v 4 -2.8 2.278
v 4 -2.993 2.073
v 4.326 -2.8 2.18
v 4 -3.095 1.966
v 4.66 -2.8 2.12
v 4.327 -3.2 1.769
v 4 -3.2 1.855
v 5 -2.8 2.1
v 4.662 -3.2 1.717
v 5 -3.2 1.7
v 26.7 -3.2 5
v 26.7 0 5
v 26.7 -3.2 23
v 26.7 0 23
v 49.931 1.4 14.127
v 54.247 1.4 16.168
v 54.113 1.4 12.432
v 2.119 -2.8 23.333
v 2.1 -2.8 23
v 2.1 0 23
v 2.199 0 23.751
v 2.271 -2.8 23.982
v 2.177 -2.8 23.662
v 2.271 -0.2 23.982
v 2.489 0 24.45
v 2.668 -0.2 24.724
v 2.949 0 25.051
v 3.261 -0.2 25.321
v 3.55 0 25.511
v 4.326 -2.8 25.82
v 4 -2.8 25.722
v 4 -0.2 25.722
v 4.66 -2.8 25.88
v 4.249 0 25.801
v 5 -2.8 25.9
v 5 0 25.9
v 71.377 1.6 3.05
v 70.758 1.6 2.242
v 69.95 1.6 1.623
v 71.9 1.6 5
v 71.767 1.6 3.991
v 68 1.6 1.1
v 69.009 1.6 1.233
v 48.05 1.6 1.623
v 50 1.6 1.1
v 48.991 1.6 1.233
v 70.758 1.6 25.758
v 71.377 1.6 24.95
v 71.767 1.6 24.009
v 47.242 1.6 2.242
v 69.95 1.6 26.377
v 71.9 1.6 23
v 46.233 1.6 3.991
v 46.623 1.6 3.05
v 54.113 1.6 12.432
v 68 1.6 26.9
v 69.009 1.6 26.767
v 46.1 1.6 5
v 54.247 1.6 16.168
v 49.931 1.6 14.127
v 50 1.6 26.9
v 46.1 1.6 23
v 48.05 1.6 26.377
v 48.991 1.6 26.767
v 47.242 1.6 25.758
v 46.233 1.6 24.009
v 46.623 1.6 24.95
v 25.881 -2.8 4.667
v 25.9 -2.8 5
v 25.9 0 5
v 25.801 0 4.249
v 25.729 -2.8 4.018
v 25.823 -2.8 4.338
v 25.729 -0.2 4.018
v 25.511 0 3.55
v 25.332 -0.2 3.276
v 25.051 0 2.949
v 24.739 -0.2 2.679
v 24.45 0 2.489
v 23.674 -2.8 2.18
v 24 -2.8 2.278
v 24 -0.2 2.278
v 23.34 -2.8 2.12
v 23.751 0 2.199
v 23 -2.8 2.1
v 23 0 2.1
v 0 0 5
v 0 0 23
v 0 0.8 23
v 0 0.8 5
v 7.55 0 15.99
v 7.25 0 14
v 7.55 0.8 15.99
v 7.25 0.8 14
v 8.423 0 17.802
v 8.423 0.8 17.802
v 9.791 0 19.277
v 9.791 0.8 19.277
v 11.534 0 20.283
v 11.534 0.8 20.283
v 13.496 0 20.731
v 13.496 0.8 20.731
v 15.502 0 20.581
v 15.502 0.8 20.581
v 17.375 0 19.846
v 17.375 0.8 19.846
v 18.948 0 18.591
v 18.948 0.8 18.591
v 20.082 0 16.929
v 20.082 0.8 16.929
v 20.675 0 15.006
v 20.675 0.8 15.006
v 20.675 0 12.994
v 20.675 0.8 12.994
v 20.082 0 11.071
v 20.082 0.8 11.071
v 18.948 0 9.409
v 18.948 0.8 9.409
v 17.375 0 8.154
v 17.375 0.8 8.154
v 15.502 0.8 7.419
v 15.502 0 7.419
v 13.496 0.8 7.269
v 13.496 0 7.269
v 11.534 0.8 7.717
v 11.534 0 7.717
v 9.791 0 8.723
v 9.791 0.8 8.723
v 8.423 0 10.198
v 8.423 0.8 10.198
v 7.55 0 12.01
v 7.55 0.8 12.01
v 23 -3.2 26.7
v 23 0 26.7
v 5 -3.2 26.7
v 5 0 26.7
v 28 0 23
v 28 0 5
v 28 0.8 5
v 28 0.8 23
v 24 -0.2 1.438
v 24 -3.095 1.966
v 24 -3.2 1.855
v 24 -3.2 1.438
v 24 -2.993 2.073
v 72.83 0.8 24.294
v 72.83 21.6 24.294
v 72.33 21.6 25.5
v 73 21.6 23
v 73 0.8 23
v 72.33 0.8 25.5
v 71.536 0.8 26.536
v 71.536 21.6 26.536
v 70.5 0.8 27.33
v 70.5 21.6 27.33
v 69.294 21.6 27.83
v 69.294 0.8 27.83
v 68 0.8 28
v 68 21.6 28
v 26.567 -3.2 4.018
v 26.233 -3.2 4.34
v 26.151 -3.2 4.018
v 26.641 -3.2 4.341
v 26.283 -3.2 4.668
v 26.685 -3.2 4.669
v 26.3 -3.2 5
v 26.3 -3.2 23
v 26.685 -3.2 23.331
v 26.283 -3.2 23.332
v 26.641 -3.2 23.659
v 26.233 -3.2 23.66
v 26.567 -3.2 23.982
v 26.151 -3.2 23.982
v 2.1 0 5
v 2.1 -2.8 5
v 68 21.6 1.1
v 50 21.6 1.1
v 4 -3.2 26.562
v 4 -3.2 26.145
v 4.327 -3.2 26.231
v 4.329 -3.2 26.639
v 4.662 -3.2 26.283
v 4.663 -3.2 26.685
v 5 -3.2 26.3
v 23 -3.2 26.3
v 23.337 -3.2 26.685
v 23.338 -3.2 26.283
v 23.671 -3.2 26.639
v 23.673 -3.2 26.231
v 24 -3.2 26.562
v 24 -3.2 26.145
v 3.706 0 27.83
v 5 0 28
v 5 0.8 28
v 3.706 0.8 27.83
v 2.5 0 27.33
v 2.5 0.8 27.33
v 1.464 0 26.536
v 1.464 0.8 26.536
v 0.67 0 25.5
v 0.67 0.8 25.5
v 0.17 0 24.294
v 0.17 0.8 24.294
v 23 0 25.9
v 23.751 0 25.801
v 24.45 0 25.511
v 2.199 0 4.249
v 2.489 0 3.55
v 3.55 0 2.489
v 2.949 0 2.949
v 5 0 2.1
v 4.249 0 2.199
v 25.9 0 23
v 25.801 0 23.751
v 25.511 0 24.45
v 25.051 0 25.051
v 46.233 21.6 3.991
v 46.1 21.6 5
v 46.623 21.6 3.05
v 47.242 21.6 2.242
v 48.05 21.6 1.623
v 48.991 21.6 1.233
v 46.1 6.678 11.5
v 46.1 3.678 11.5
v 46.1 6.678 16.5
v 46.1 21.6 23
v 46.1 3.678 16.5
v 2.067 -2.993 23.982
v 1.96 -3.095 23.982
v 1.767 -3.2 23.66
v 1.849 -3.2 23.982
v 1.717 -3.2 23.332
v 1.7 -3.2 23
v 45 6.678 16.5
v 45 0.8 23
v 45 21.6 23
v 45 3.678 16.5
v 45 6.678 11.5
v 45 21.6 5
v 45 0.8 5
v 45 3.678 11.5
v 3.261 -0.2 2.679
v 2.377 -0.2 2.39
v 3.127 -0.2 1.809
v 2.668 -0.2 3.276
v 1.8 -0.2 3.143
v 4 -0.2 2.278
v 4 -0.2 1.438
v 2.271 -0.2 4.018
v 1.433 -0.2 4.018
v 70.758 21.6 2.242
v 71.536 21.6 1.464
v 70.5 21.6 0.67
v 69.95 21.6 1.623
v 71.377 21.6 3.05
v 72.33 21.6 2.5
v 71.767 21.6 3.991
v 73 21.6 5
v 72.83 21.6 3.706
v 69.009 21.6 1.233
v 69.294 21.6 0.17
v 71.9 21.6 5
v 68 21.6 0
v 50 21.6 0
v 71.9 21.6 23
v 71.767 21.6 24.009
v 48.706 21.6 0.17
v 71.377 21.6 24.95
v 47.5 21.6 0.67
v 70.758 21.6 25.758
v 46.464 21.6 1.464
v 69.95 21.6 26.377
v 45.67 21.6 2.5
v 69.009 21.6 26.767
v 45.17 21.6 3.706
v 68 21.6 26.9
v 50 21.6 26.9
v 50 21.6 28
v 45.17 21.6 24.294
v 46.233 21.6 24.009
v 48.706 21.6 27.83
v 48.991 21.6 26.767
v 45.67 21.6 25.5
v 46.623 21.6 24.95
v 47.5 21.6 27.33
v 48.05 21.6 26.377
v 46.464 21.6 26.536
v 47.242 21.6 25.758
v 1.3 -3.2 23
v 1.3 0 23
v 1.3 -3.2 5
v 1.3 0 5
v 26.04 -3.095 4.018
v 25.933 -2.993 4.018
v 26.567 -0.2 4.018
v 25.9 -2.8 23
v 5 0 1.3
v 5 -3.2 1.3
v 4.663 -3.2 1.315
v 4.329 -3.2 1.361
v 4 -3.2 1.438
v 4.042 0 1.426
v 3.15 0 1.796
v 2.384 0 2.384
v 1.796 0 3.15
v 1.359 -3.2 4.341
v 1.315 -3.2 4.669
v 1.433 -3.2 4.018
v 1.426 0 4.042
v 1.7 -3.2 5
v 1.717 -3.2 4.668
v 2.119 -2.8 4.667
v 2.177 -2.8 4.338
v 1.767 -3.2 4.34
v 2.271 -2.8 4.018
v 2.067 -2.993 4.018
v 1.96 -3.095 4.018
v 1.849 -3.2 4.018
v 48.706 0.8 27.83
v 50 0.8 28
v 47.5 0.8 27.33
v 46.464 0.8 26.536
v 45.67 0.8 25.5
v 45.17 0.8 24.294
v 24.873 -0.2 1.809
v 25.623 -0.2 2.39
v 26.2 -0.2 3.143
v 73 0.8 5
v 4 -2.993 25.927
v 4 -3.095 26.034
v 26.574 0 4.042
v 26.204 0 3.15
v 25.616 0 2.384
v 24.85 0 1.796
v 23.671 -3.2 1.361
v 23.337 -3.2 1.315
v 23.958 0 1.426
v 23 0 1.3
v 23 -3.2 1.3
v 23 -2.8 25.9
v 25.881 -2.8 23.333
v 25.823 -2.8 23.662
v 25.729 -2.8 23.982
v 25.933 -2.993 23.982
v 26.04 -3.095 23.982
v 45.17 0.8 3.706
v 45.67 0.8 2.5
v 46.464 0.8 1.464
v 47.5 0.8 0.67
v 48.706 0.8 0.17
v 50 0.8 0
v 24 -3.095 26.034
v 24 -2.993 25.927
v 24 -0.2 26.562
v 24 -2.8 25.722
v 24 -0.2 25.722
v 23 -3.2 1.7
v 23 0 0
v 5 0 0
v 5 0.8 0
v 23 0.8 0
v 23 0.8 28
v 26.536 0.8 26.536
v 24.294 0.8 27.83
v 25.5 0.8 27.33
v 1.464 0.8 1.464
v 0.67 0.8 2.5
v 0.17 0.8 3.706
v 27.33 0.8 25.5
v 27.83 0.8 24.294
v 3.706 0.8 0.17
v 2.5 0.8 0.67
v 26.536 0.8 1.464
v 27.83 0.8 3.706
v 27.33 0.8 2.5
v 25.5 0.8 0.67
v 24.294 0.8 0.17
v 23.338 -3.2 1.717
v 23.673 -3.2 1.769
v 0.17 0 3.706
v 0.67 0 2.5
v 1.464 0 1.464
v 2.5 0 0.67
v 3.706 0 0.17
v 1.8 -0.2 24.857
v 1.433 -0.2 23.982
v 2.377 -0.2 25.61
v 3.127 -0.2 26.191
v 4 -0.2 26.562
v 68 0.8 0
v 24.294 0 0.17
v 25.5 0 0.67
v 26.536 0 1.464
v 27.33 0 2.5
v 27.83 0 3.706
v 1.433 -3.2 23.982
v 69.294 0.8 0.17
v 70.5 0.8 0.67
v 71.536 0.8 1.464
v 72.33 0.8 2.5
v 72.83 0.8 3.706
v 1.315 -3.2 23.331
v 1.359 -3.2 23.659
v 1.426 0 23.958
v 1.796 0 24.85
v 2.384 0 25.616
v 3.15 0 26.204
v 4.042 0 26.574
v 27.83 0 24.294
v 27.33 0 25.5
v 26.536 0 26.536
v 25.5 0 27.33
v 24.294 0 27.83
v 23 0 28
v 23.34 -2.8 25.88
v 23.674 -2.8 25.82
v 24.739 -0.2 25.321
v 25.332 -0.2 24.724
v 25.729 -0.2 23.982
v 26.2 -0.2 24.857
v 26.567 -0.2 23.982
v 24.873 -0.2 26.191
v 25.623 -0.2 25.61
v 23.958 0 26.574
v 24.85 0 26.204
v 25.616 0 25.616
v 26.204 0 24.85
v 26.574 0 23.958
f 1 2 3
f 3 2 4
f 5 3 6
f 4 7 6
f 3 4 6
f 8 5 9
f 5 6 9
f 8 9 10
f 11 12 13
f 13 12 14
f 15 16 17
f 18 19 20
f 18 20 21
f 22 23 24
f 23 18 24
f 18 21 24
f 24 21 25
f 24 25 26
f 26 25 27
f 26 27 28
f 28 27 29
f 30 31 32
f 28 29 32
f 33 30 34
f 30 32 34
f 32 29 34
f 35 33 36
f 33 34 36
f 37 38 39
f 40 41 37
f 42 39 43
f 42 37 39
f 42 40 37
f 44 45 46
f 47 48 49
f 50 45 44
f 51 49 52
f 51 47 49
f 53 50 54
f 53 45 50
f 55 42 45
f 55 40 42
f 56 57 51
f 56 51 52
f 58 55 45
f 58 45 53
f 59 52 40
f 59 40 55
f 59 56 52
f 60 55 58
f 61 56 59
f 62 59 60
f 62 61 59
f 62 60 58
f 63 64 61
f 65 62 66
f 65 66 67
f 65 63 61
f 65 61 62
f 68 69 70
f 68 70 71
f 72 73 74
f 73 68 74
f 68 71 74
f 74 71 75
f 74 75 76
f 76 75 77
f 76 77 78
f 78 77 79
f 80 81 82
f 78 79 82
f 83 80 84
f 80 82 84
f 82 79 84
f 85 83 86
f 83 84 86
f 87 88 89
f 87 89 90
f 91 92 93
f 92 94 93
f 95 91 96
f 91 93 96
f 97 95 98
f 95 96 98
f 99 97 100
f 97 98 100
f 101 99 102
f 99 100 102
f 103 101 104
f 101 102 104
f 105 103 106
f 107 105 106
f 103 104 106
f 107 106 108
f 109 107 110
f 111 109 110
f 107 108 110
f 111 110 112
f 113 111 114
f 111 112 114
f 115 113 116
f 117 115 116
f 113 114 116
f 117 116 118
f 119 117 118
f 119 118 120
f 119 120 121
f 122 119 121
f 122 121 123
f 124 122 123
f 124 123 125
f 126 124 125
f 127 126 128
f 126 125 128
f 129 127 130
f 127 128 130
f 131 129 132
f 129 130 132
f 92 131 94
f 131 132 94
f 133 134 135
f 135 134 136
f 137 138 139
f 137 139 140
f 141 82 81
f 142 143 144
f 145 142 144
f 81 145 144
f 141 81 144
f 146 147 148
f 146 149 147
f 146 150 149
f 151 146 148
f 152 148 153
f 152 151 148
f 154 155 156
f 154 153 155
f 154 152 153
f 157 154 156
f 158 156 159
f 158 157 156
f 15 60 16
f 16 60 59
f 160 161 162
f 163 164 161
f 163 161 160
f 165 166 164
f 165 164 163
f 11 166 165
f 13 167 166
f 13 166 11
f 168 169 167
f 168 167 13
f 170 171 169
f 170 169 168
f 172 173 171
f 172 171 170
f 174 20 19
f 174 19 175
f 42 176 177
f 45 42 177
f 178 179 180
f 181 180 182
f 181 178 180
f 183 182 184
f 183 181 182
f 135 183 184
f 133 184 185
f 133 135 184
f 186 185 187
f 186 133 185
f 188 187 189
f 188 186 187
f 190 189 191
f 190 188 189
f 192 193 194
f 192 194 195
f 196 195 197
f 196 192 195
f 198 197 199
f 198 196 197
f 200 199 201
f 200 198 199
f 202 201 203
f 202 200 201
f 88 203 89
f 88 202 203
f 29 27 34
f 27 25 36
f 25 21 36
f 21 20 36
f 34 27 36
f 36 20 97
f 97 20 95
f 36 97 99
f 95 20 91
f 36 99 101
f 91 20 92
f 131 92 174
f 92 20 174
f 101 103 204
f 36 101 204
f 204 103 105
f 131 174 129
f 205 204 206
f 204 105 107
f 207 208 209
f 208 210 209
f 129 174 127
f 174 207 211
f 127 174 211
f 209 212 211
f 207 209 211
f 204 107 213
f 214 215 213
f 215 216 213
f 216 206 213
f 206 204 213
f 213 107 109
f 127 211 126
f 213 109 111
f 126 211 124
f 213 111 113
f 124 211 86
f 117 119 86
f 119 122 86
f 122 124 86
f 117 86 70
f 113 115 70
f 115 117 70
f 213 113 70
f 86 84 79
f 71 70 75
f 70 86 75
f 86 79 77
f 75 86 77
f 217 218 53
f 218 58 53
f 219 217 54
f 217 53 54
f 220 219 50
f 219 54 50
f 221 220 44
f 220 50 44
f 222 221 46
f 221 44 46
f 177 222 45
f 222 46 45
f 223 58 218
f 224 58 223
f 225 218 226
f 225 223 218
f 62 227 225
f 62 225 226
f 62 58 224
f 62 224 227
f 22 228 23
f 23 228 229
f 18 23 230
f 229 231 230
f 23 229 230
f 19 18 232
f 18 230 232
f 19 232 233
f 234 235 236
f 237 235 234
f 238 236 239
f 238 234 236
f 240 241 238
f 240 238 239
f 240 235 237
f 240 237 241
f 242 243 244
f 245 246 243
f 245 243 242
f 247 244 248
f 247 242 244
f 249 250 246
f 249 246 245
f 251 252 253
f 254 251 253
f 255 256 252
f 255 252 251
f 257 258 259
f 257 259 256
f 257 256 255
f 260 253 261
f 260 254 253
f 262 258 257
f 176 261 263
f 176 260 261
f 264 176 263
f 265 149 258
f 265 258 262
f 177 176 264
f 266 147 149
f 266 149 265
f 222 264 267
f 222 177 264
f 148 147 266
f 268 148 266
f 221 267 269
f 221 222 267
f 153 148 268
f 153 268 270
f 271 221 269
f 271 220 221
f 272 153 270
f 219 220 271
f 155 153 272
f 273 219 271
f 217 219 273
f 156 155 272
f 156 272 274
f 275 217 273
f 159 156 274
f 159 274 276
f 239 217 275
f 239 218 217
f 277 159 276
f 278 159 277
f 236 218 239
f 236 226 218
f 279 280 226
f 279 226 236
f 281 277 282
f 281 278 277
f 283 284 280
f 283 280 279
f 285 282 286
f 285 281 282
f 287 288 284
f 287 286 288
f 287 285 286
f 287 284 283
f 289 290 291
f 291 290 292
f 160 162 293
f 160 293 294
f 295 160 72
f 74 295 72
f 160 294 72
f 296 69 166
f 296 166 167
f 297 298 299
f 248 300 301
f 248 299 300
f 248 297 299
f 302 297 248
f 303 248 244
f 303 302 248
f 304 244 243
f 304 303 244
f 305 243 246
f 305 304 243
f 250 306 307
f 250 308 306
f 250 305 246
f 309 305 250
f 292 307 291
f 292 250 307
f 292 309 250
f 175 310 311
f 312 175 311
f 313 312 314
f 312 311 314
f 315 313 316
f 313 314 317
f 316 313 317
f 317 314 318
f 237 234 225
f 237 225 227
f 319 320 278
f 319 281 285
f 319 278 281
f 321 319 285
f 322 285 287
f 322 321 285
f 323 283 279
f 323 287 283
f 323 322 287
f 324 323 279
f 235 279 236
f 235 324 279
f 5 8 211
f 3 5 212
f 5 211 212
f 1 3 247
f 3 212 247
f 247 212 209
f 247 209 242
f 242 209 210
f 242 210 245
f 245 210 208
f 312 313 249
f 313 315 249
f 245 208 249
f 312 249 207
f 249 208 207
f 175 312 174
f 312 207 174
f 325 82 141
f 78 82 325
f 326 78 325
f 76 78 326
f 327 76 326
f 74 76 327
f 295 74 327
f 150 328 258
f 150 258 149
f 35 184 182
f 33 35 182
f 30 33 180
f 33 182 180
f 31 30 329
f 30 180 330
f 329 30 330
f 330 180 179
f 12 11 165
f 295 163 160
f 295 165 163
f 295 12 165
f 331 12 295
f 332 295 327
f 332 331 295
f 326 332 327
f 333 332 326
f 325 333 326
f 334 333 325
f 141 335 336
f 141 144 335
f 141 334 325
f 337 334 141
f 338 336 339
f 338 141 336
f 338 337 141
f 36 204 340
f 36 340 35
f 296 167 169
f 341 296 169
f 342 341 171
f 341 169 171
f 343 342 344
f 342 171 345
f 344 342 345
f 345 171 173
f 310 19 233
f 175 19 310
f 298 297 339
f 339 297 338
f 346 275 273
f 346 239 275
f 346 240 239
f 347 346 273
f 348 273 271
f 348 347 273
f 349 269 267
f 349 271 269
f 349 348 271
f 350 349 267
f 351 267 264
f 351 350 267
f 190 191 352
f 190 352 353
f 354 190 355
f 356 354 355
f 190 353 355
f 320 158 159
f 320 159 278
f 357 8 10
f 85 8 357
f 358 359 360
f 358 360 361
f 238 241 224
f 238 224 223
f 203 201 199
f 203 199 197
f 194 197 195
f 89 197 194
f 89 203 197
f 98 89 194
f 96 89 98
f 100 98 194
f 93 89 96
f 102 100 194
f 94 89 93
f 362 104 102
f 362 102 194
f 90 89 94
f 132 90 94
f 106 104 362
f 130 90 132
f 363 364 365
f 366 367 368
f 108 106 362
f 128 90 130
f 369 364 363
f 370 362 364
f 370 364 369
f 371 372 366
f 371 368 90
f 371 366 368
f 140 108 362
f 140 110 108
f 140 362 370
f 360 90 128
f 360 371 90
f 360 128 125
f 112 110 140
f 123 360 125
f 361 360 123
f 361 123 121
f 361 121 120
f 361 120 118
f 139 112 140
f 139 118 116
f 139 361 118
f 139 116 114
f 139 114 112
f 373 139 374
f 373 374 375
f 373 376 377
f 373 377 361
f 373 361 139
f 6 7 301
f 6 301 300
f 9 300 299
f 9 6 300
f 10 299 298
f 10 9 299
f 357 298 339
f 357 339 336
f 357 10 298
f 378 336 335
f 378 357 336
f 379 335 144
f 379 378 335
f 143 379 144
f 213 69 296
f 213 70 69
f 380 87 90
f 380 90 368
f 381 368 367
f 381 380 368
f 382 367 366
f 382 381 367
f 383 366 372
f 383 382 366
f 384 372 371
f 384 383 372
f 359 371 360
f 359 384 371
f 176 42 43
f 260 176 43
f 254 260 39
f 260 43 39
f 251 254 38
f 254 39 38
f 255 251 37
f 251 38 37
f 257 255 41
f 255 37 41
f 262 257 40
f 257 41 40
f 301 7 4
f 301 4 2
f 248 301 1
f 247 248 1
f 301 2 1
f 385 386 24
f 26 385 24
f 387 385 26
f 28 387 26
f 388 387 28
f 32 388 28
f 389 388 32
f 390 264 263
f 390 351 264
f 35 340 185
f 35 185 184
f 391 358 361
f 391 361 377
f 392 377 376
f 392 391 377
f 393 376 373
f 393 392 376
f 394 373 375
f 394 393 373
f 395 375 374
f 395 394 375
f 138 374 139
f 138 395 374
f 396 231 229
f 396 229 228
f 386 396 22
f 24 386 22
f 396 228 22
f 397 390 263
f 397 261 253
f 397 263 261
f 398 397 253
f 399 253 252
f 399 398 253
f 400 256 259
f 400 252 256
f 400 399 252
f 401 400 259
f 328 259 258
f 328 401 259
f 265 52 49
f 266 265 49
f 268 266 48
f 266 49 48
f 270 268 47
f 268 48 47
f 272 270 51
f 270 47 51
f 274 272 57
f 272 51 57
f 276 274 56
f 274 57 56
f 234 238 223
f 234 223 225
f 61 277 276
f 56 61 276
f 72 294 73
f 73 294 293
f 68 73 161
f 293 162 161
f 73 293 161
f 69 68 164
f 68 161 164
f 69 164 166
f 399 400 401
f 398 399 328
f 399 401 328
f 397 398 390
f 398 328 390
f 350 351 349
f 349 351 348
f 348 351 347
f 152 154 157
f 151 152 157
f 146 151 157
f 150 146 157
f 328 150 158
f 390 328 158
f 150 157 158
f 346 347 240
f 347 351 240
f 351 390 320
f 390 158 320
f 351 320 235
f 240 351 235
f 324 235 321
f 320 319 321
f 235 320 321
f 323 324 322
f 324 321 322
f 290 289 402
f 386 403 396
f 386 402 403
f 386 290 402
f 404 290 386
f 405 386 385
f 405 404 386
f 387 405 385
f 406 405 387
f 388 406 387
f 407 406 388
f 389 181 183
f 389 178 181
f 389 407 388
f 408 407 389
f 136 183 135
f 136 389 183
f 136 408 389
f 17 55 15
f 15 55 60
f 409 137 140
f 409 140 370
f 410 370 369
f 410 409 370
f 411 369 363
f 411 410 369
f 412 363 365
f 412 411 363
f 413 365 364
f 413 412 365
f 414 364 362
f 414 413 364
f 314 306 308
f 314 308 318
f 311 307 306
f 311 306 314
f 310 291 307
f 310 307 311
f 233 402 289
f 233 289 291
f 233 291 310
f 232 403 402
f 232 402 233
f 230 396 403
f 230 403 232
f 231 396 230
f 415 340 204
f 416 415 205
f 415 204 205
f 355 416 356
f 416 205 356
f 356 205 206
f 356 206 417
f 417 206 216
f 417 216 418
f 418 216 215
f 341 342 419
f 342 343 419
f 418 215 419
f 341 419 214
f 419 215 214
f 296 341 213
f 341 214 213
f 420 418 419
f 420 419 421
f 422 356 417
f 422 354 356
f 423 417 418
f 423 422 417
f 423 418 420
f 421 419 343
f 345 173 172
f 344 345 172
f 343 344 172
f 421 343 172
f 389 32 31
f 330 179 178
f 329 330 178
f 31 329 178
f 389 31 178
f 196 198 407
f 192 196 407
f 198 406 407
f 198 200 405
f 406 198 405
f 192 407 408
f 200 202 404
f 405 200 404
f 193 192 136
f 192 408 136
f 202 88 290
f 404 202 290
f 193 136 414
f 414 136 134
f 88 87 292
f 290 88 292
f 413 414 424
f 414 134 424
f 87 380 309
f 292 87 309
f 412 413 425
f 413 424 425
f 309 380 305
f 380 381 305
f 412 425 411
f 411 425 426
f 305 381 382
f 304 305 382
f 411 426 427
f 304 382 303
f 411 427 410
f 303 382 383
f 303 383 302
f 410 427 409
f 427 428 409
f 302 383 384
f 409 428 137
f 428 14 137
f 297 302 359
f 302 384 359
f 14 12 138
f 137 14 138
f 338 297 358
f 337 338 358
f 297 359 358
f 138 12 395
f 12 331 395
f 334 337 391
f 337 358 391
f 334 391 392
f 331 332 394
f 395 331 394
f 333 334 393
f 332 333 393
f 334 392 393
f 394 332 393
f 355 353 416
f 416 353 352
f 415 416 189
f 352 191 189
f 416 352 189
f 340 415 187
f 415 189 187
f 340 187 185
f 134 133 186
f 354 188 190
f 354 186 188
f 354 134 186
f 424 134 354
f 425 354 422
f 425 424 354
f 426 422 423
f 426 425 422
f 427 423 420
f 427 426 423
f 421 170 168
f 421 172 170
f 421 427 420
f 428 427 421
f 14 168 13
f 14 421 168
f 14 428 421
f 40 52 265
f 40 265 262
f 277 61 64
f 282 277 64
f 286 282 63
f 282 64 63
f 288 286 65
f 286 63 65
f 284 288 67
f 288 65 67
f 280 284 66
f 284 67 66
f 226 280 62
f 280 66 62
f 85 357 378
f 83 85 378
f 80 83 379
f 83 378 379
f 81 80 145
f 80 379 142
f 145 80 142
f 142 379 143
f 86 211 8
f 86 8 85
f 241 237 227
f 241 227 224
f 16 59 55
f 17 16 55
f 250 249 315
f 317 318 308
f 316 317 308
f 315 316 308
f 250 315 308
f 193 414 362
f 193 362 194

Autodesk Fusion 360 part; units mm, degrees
sketch "Sketch1" plane through (0, 0, 0) normal (0, 1, 0) x (1, 0, 0)
  line L0 (5, 0) -> (23, 0)
  line L1 (28, -5) -> (28, -23)
  line L2 (23, -28) -> (5, -28)
  line L3 (0, -23) -> (0, -5)
  arc A0 (5, 0) -> (0, -5) centre (5, -5) ccw
  arc A1 (28, -5) -> (23, 0) centre (23, -5) ccw
  arc A2 (23, -28) -> (28, -23) centre (23, -23) ccw
  arc A3 (0, -23) -> (5, -28) centre (5, -23) ccw
  point P0 (28, 0)
  point P1 (0, -28)
  dimension "d1" = 28
  dimension "d2" = 28
  dimension "d3" = 5
extrude "Extrude1" add sketch "Sketch1" along normal blind 0.8 makes body 1
sketch "Sketch2" plane through (0, 0.8, 0) normal (0, 1, 0) x (-1, 0, 0)
  arc A0 (-5, 0) -> (0, 5) centre (-5, 5) ccw
  line L0 (0, 5) -> (0, 23)
  arc A1 (0, 23) -> (-5, 28) centre (-5, 23) ccw
  line L1 (-5, 28) -> (-23, 28)
  arc A2 (-23, 28) -> (-28, 23) centre (-23, 23) ccw
  line L2 (-28, 23) -> (-28, 5)
  arc A3 (-28, 5) -> (-23, 0) centre (-23, 5) ccw
  line L3 (-23, 0) -> (-5, 0)
  line L4 (0, 14) -> (-28, 14)
  line L5 (-14, 0) -> (-14, 28)
  circle A4 centre (-14, 14) radius 6.75
  dimension "d6" = 13.5
extrude "Extrude2" cut sketch "Sketch2" against normal blind 10 contours L4 L5 A4 | L4 L5 A4 | L4 L5 A4 | L4 L5 A4 bodies 1
sketch "Sketch3" plane through (0, 0, 0) normal (0, -1, 0) x (1, 0, 0)
  circle A0 centre (14, 14) radius 6.75
  arc A1 (0, 5) -> (5, 0) centre (5, 5) ccw
  line L0 (5, 0) -> (23, 0)
  arc A2 (23, 0) -> (28, 5) centre (23, 5) ccw
  line L1 (28, 5) -> (28, 23)
  arc A3 (28, 23) -> (23, 28) centre (23, 23) ccw
  line L2 (23, 28) -> (5, 28)
  arc A4 (5, 28) -> (0, 23) centre (5, 23) ccw
  line L3 (0, 23) -> (0, 5)
  arc A5 (5, 26.7) -> (1.3, 23) centre (5, 23) ccw
  line L4 (1.3, 23) -> (1.3, 5)
  arc A6 (1.3, 5) -> (5, 1.3) centre (5, 5) ccw
  line L5 (5, 1.3) -> (23, 1.3)
  arc A7 (23, 1.3) -> (26.7, 5) centre (23, 5) ccw
  line L6 (26.7, 5) -> (26.7, 23)
  arc A8 (26.7, 23) -> (23, 26.7) centre (23, 23) ccw
  line L7 (23, 26.7) -> (5, 26.7)
  arc A9 (5, 25.9) -> (2.1, 23) centre (5, 23) ccw
  line L8 (2.1, 23) -> (2.1, 5)
  arc A10 (2.1, 5) -> (5, 2.1) centre (5, 5) ccw
  line L9 (5, 2.1) -> (23, 2.1)
  arc A11 (23, 2.1) -> (25.9, 5) centre (23, 5) ccw
  line L10 (25.9, 5) -> (25.9, 23)
  arc A12 (25.9, 23) -> (23, 25.9) centre (23, 23) ccw
  line L11 (23, 25.9) -> (5, 25.9)
  dimension "d9" = -1.3
  dimension "d10" = -2.1
extrude "Extrude3" add sketch "Sketch3" along normal blind 3.2 contours A5 L4 A6 L5 A7 L6 A8 L7 bodies 1
sketch "Sketch4" plane through (0, 0.8, 0) normal (0, 1, 0) x (-1, 0, 0)
  circle A0 centre (-14, 14) radius 6.75
  arc A1 (-5, 0) -> (0, 5) centre (-5, 5) ccw
  line L0 (0, 5) -> (0, 23)
  arc A2 (0, 23) -> (-5, 28) centre (-5, 23) ccw
  line L1 (-5, 28) -> (-23, 28)
  arc A3 (-23, 28) -> (-28, 23) centre (-23, 23) ccw
  line L2 (-28, 23) -> (-28, 5)
  arc A4 (-28, 5) -> (-23, 0) centre (-23, 5) ccw
  line L3 (-23, 0) -> (-5, 0)
  line L4 (-50, 0) -> (-68, 0)
  line L5 (-73, 5) -> (-73, 23)
  line L6 (-68, 28) -> (-50, 28)
  line L7 (-45, 23) -> (-45, 5)
  arc A5 (-50, 0) -> (-45, 5) centre (-50, 5) ccw
  arc A6 (-73, 5) -> (-68, 0) centre (-68, 5) ccw
  arc A7 (-68, 28) -> (-73, 23) centre (-68, 23) ccw
  arc A8 (-45, 23) -> (-50, 28) centre (-50, 23) ccw
  point P0 (-45, 0)
  point P1 (-73, 0)
  point P2 (-45, 28)
  dimension "d13" = 28
  dimension "d14" = 28
  dimension "d15" = 5
extrude "Extrude4" add sketch "Sketch4" along normal blind 0.8 separate body contours L4 L5 L6 L7 A5 A6 A7 A8 makes body 2
sketch "Sketch5" plane through (0, 1.6, 0) normal (0, 1, 0) x (-1, 0, 0)
  arc A0 (-50, 0) -> (-45, 5) centre (-50, 5) ccw
  line L0 (-45, 5) -> (-45, 23)
  arc A1 (-45, 23) -> (-50, 28) centre (-50, 23) ccw
  line L1 (-50, 28) -> (-68, 28)
  arc A2 (-68, 28) -> (-73, 23) centre (-68, 23) ccw
  line L2 (-73, 23) -> (-73, 5)
  arc A3 (-73, 5) -> (-68, 0) centre (-68, 5) ccw
  line L3 (-68, 0) -> (-50, 0)
  arc A4 (-46.1, 23) -> (-50, 26.9) centre (-50, 23) ccw
  line L4 (-50, 26.9) -> (-68, 26.9)
  arc A5 (-68, 26.9) -> (-71.9, 23) centre (-68, 23) ccw
  line L5 (-71.9, 23) -> (-71.9, 5)
  arc A6 (-71.9, 5) -> (-68, 1.1) centre (-68, 5) ccw
  line L6 (-68, 1.1) -> (-50, 1.1)
  arc A7 (-50, 1.1) -> (-46.1, 5) centre (-50, 5) ccw
  line L7 (-46.1, 5) -> (-46.1, 23)
  dimension "d18" = -1.1
extrude "Extrude5" add sketch "Sketch5" along normal blind 20 bodies 2
sketch "Sketch6" plane through (0, -3.2, 0) normal (0, -1, 0) x (1, 0, 0)
  line L0 (5, 25.9) -> (23, 25.9)
  arc A0 (25.9, 23) -> (23, 25.9) centre (23, 23) ccw
  line L1 (25.9, 23) -> (25.9, 5)
  arc A1 (23, 2.1) -> (25.9, 5) centre (23, 5) ccw
  line L2 (23, 2.1) -> (5, 2.1)
  arc A2 (2.1, 5) -> (5, 2.1) centre (5, 5) ccw
  line L3 (2.1, 5) -> (2.1, 23)
  arc A3 (5, 25.9) -> (2.1, 23) centre (5, 23) ccw
  line L4 (23, 26.7) -> (5, 26.7)
  arc A4 (5, 26.7) -> (1.3, 23) centre (5, 23) ccw
  line L5 (1.3, 23) -> (1.3, 5)
  arc A5 (1.3, 5) -> (5, 1.3) centre (5, 5) ccw
  line L6 (5, 1.3) -> (23, 1.3)
  arc A6 (23, 1.3) -> (26.7, 5) centre (23, 5) ccw
  line L7 (26.7, 5) -> (26.7, 23)
  arc A7 (26.7, 23) -> (23, 26.7) centre (23, 23) ccw
  line L8 (14, 25.9) -> (14, 1.3)
  line L9 (2.1, 14) -> (26.7, 14)
  line L10 (28.4207, 4.0183) -> (-0.4207, 4.0183)
  line L11 (-0.4207, 4.0183) -> (-0.4207, 23.9817)
  line L12 (-0.4207, 23.9817) -> (28.4207, 23.9817)
  line L13 (28.4207, 23.9817) -> (28.4207, 4.0183)
  line L14 (28.4207, 4.0183) -> (-0.4207, 23.9817) construction
  line L15 (-0.4207, 4.0183) -> (28.4207, 23.9817) construction
  line L16 (24, 1) -> (4, 1)
  line L17 (4, 1) -> (4, 27)
  line L18 (4, 27) -> (24, 27)
  line L19 (24, 27) -> (24, 1)
  line L20 (24, 1) -> (4, 27) construction
  line L21 (4, 1) -> (24, 27) construction
  point P0 (14, 14)
  point P1 (14, 14)
extrude "Extrude6" cut sketch "Sketch6" against normal blind 3 contours A3 A4 L12 L17 | A0 A7 L12 L19 | A2 A5 L10 L17 | A1 A6 L10 L19 bodies 1
sketch "Sketch7" plane through (45, 0, 0) normal (-1, 0, 0) x (0, 0, 1)
  line L0 (5, 0.8) -> (23, 0.8)
  line L1 (23, 0.8) -> (23, 21.6)
  line L2 (23, 21.6) -> (5, 21.6)
  line L3 (5, 21.6) -> (5, 0.8)
  line L4 (14, 21.6) -> (14, 0.8)
  line L5 (16.5, 3.6782) -> (11.5, 3.6782)
  line L6 (11.5, 3.6782) -> (11.5, 6.6782)
  line L7 (11.5, 6.6782) -> (16.5, 6.6782)
  line L8 (16.5, 6.6782) -> (16.5, 3.6782)
  line L9 (16.5, 3.6782) -> (11.5, 6.6782) construction
  line L10 (11.5, 3.6782) -> (16.5, 6.6782) construction
  point P0 (14, 5.1782)
  dimension "d23" = 5
  dimension "d24" = 3
extrude "Extrude7" cut sketch "Sketch7" against normal blind 4 contours L4 L5 L6 L7 | L4 L5 L7 L8 bodies 2
sketch "Sketch8" plane through (0, 1.6, 0) normal (0, 1, 0) x (-1, 0, 0)
  arc A0 (-46.1, 23) -> (-50, 26.9) centre (-50, 23) ccw
  line L0 (-50, 26.9) -> (-68, 26.9)
  arc A1 (-68, 26.9) -> (-71.9, 23) centre (-68, 23) ccw
  line L1 (-71.9, 23) -> (-71.9, 5)
  arc A2 (-71.9, 5) -> (-68, 1.1) centre (-68, 5) ccw
  line L2 (-68, 1.1) -> (-50, 1.1)
  arc A3 (-50, 1.1) -> (-46.1, 5) centre (-50, 5) ccw
  line L3 (-46.1, 5) -> (-46.1, 23)
  line L4 (-49.9308, 14.1272) -> (-54.2473, 16.1679)
  line L5 (-54.2473, 16.1679) -> (-54.1128, 12.4316)
  line L6 (-54.1128, 12.4316) -> (-49.9308, 14.1272)
  point P0 (-52.32, 13.6169)
extrude "Extrude8" cut sketch "Sketch8" against normal blind 0.2 contours L4 L5 L6 bodies 2
chamfer "Chamfer1" distance 0.4 angle 45 12 edges at (14, -3.2, 25.9) (23.5078, -3.2, 25.8552) (4.4922, -3.2, 25.8552) (2.1, -3.2, 14) (2.1431, -3.2, 23.4983) (2.1431, -3.2, 4.5017) (25.9, -3.2, 14) (25.8569, -3.2, 4.5017) (25.8569, -3.2, 23.4983) (14, -3.2, 2.1) (4.4922, -3.2, 2.1448) (23.5078, -3.2, 2.1448) on bodies 1
copy_body "Body->Comp1" bodies 1 removing the originals makes body 3 in component "Penutup atas"
copy_body "Body->Comp2" bodies 2 removing the originals makes body 4 in component "Body bawah"
component "Penutup atas" placed x (1, 0, 0) y (0, 1, 0) z (0, 0, 1) at (0, 0, 0)
component "Body bawah" placed x (1, 0, 0) y (0, 1, 0) z (0, 0, 1) at (0, 0, 0)
equation "d10 = -1.3 mm - 0.8 mm"
equation "d18 = -1 mm - 0.1 mm"
